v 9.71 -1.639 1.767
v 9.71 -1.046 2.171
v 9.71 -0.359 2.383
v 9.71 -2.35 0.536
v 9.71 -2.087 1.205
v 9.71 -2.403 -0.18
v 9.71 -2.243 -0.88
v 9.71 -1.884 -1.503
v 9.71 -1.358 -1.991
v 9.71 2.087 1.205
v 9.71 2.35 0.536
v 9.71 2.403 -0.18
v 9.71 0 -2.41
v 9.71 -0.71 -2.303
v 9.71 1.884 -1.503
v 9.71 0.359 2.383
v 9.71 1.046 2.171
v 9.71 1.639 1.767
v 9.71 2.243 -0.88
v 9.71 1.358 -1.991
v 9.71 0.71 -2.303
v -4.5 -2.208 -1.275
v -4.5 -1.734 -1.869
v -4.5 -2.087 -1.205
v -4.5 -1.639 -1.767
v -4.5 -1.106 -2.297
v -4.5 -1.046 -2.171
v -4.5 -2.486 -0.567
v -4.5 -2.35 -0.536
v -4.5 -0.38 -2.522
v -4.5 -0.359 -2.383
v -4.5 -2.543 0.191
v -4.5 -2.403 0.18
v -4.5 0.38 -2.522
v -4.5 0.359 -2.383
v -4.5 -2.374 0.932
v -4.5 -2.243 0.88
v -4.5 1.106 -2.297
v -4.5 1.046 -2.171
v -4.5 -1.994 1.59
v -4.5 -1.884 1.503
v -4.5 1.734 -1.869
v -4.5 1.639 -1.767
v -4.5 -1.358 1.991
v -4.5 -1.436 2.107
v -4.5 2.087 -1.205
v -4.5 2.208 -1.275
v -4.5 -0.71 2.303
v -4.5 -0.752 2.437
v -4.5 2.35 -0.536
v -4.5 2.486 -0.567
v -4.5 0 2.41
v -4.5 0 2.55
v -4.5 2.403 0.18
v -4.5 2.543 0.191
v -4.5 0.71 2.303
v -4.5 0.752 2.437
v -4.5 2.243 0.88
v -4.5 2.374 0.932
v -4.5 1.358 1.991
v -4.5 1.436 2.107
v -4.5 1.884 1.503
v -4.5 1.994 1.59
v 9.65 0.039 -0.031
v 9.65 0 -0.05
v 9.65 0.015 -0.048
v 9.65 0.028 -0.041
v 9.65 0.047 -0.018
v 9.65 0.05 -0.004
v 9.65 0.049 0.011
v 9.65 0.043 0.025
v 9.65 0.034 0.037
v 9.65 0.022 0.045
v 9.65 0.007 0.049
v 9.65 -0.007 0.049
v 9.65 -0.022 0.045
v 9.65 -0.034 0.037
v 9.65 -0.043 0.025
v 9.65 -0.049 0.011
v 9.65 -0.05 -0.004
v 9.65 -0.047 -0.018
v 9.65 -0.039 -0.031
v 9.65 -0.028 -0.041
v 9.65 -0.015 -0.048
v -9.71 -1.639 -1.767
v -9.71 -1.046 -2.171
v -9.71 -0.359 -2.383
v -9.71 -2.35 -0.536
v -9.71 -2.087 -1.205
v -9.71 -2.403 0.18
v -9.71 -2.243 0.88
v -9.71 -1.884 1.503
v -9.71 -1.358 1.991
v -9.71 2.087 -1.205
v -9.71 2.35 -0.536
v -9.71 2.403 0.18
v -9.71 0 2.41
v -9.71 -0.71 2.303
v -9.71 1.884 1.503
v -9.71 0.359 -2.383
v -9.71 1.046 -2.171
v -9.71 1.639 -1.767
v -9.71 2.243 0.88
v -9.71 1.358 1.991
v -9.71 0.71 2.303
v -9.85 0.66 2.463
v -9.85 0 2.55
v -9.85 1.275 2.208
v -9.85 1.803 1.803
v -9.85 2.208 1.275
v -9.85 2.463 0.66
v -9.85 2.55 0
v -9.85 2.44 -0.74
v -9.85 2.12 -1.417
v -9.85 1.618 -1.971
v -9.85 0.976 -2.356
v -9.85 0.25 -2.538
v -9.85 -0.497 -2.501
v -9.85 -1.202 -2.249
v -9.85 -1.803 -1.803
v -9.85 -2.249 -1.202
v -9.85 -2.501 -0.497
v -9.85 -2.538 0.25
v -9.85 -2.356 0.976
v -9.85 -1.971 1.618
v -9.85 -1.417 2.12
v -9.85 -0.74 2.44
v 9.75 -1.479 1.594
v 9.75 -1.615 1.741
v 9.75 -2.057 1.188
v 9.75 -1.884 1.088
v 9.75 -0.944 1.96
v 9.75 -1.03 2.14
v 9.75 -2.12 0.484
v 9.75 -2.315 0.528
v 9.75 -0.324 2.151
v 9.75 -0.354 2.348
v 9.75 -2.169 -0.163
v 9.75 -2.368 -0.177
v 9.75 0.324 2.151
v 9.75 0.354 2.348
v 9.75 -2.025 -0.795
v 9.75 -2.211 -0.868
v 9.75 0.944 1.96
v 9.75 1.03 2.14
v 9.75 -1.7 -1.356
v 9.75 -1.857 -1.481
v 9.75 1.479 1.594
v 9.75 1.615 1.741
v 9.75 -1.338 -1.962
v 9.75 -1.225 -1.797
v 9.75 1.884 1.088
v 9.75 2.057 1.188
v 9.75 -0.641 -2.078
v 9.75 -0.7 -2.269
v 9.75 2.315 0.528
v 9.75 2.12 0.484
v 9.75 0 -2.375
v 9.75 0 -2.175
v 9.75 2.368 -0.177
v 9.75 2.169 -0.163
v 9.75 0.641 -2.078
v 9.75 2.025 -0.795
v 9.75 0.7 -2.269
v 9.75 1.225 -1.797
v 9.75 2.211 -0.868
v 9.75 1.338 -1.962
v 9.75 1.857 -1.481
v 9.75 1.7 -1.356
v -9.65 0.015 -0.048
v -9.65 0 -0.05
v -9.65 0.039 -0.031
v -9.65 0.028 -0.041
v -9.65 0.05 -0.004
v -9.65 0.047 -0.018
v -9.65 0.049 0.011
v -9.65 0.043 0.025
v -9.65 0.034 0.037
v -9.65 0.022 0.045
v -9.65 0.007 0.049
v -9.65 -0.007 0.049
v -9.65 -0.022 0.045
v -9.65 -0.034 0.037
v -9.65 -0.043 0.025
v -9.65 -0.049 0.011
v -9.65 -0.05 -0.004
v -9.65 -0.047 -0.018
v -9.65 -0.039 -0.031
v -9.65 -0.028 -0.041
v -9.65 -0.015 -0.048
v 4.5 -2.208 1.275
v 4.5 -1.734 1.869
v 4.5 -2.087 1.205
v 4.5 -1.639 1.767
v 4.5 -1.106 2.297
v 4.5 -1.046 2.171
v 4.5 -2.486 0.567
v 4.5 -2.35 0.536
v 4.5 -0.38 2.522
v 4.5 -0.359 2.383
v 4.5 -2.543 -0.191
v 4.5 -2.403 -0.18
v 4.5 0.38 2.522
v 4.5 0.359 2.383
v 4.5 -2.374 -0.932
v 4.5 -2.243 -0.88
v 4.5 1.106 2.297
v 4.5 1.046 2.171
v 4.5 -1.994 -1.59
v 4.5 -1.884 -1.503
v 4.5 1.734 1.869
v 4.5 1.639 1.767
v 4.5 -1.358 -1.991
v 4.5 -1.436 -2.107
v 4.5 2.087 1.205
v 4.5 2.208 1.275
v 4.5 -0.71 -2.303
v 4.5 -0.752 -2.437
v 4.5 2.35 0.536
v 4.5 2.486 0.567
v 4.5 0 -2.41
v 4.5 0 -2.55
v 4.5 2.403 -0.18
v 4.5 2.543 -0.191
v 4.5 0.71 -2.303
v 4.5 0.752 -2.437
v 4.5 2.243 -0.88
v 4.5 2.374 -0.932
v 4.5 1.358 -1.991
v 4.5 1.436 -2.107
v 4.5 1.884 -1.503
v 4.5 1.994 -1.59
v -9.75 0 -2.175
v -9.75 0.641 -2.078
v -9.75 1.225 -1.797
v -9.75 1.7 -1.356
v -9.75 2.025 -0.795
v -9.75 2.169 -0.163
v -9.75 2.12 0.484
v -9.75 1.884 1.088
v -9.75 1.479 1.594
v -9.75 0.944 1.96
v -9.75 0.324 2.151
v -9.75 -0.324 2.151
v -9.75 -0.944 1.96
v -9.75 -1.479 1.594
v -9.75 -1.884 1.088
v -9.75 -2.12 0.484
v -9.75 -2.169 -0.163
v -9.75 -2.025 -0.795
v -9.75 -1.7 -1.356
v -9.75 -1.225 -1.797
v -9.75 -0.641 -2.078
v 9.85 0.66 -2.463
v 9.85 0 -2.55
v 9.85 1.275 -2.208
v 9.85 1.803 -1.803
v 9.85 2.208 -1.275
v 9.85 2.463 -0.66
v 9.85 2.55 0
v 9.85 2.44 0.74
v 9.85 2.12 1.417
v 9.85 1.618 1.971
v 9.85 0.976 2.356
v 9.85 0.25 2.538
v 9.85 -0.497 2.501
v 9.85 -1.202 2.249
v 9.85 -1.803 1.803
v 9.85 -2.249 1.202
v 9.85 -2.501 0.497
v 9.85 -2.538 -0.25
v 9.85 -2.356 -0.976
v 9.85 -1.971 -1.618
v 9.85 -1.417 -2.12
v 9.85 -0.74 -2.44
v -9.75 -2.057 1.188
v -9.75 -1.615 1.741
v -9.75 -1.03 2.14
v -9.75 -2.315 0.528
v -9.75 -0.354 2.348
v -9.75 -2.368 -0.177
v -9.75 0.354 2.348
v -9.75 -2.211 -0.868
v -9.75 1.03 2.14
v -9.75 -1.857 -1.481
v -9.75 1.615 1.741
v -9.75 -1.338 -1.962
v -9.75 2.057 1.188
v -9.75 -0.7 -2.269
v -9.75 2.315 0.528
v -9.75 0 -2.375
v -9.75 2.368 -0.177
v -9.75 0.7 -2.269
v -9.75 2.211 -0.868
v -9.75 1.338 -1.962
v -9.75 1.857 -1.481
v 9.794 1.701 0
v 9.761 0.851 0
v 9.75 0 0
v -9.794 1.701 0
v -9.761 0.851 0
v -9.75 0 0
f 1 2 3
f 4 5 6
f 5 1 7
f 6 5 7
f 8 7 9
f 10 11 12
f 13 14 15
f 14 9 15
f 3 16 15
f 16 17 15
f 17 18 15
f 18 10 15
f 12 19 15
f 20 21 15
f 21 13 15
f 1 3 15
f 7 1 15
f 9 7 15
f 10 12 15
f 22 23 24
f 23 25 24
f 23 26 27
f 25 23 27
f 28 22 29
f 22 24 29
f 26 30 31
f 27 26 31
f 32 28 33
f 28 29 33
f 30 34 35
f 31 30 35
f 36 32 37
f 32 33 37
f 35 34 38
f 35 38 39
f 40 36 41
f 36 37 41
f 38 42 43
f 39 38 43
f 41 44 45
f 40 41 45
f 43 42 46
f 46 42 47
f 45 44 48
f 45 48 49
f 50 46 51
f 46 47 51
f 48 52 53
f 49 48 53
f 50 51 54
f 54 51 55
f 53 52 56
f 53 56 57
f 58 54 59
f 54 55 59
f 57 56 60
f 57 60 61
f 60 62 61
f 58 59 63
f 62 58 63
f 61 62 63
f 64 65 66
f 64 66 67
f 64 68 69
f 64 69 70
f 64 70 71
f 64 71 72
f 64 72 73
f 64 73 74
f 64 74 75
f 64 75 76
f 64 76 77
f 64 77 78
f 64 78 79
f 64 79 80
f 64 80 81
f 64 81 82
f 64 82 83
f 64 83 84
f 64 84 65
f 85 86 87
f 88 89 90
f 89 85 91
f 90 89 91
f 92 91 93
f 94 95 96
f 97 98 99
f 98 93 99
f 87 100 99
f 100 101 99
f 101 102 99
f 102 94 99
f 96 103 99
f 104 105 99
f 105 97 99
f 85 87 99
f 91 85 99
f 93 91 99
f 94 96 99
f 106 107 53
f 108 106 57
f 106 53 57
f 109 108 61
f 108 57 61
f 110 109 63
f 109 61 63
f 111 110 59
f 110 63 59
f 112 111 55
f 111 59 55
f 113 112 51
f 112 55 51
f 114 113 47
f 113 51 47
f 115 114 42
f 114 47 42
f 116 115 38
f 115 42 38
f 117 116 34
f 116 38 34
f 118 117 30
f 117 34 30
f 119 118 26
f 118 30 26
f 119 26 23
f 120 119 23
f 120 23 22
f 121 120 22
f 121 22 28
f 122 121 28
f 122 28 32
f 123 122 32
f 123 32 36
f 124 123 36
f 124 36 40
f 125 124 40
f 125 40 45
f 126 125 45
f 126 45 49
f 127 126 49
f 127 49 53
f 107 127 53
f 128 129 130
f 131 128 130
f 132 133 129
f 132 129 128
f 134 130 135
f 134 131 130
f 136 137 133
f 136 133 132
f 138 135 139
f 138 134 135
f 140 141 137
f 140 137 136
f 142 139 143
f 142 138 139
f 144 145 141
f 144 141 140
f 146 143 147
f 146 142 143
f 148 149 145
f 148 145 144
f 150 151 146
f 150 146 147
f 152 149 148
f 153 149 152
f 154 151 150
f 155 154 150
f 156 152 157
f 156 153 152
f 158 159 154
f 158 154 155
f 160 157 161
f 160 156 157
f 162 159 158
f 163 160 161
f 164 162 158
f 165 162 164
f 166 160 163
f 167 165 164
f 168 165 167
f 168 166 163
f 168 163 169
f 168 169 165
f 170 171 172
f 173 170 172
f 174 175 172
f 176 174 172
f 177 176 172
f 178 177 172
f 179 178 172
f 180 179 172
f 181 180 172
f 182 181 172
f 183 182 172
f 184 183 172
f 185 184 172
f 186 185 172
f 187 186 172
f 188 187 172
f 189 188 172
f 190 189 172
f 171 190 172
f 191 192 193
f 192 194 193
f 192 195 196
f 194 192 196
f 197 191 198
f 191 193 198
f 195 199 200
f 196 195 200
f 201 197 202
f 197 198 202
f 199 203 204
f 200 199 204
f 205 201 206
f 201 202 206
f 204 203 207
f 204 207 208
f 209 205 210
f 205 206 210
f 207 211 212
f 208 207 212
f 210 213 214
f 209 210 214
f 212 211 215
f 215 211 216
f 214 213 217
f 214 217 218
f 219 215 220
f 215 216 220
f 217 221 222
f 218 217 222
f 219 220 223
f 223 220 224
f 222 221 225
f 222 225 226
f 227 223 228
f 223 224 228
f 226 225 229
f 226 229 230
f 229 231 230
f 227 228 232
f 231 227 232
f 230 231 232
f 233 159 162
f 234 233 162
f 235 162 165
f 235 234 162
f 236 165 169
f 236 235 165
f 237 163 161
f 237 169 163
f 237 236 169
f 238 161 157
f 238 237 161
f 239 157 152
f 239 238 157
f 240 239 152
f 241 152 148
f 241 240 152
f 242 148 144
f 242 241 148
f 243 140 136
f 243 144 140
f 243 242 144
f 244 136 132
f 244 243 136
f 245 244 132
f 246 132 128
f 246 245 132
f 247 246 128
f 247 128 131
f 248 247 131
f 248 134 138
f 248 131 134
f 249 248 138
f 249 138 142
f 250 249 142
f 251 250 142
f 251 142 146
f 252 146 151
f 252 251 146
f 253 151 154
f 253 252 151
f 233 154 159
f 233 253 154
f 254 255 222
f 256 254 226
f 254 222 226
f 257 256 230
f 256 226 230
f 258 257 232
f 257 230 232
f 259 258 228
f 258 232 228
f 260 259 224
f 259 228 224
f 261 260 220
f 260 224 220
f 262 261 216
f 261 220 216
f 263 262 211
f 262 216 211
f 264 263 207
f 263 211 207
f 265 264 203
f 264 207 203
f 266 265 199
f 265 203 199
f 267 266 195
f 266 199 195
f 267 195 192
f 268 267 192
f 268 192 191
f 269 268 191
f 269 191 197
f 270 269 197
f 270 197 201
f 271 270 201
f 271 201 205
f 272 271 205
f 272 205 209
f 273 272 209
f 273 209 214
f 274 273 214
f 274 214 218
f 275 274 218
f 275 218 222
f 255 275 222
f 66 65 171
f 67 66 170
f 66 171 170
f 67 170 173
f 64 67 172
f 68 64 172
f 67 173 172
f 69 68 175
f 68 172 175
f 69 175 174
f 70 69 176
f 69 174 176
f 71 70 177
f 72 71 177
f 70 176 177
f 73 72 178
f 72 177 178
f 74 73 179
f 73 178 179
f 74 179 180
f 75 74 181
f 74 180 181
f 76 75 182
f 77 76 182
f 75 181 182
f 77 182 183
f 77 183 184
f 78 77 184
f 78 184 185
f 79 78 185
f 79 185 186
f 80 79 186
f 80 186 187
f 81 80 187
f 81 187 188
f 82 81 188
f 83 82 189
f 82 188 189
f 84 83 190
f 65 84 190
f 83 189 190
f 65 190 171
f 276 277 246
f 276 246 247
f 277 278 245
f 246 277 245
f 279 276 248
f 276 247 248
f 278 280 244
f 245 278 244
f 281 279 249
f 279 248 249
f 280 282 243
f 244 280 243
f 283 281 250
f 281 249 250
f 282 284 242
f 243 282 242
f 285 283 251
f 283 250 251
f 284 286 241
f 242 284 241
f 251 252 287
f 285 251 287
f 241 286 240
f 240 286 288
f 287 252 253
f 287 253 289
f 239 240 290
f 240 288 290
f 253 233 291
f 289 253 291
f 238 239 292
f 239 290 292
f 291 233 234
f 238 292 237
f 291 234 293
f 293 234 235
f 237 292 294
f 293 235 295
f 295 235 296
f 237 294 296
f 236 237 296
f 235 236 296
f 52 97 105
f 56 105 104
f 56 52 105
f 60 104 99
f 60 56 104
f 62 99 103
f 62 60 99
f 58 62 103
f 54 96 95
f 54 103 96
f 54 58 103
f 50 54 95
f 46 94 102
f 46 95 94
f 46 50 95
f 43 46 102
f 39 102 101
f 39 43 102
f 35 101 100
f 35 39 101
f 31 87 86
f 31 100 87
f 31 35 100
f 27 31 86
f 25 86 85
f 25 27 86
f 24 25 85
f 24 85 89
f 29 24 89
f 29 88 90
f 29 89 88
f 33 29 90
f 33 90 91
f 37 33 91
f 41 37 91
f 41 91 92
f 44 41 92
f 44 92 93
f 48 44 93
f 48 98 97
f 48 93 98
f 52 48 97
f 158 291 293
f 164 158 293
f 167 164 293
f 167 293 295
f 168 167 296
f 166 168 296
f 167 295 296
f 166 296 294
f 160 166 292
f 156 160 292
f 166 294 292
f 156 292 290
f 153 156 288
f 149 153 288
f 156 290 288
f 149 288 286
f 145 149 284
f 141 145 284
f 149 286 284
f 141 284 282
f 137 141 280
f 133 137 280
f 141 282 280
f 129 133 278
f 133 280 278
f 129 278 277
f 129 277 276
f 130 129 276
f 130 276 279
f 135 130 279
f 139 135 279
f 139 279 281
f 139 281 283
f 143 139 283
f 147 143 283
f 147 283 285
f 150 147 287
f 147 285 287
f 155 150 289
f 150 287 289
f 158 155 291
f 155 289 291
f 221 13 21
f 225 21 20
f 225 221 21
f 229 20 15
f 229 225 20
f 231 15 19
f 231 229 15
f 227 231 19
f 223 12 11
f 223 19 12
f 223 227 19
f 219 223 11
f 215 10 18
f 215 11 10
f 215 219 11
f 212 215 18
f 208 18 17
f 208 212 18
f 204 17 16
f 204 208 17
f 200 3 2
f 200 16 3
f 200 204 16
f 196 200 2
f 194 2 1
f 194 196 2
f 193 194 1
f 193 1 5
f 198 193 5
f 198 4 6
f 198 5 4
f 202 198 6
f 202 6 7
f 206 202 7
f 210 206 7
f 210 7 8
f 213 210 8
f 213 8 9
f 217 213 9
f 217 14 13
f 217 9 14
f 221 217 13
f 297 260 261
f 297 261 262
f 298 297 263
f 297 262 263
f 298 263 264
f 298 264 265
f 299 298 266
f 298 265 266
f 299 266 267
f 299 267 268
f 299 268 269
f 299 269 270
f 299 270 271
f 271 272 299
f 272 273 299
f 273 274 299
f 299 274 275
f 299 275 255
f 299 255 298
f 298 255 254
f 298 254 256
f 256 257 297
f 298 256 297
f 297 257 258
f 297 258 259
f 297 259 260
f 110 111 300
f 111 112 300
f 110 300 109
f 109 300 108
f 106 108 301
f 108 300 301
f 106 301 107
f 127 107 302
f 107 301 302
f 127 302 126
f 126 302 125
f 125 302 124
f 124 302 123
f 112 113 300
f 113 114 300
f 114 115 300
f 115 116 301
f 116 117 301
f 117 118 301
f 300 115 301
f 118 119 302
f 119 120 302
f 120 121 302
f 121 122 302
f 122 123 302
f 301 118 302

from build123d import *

# Parameters (mm, degrees)
EXTRUDE1_DEPTH      = 9.75
EXTRUDE1_DEPTH_BACK = 9.75
SKETCH1_R           = 2.375
SHELL1_T            = -0.2
EXTRUDE2_DEPTH      = 9.65
EXTRUDE2_DEPTH_BACK = 9.65
SKETCH2_R           = 0.05
EXTRUDE3_DEPTH      = 0.1
EXTRUDE3_DEPTH_BACK = 5.25
SKETCH3_R           = 2.55
SHELL3_T            = -0.14
EXTRUDE5_DEPTH      = 0.1
EXTRUDE5_DEPTH_BACK = 5.25
SKETCH5_R           = 2.55
SHELL6_T            = -0.14


# Read off the part's stored shape, not the designer's step: Dome2, Dome3
with BuildPart() as part:
    # Sketch1 → Extrude1 (new, two sides: drawn at the far end of the back side and taken through both)
    with BuildSketch(Plane(origin=(0, 0, 0), x_dir=(0, 0, -1), z_dir=(1, 0, 0)).offset(-EXTRUDE1_DEPTH_BACK)):
        Circle(SKETCH1_R)
    extrude(amount=EXTRUDE1_DEPTH + EXTRUDE1_DEPTH_BACK)

    # Shell1
    shell1_openings = [part.faces().sort_by_distance(p)[0] for p in [
        (-9.75, 0, 0),
        (9.75, 0, 0),
    ]]
    offset(amount=SHELL1_T, openings=shell1_openings, kind=Kind.INTERSECTION)


with BuildPart() as body_2:
    # Sketch2 → Extrude2 (new, two sides: drawn at the far end of the back side and taken through both)
    with BuildSketch(Plane(origin=(0, 0, 0), x_dir=(0, 0, -1), z_dir=(1, 0, 0)).offset(-EXTRUDE2_DEPTH_BACK)):
        Circle(SKETCH2_R)
    extrude(amount=EXTRUDE2_DEPTH + EXTRUDE2_DEPTH_BACK)


with BuildPart() as body_3:
    # Sketch3 → Extrude3 (new, two sides: drawn at the far end of the back side and taken through both)
    with BuildSketch(Plane(origin=(9.75, 0, 0), x_dir=(0, 0, -1), z_dir=(1, 0, 0)).offset(-EXTRUDE3_DEPTH_BACK)):
        Circle(SKETCH3_R)
    extrude(amount=EXTRUDE3_DEPTH + EXTRUDE3_DEPTH_BACK)

    # Shell3
    shell3_openings = [body_3.faces().sort_by_distance(p)[0] for p in [
        (4.5, 0, 0),
    ]]
    offset(amount=SHELL3_T, openings=shell3_openings)

    # Dome2 outline → Dome2 (revolve, cut)
    with BuildSketch(Plane.YX):
        with BuildLine():
            Line((0, 9.850000003), (0, 9.75))
            ThreePointArc((0, 9.75), (1.275980032, 9.775009605), (2.550000032, 9.850000003))
            Line((2.550000032, 9.850000003), (0, 9.850000003))
        make_face()
    revolve(axis=Axis((0, 0, 0), (1, 0, 0)), mode=Mode.SUBTRACT)


with BuildPart() as body_4:
    # Sketch5 → Extrude5 (new, two sides: drawn at the far end of the back side and taken through both)
    with BuildSketch(Plane.ZY.offset(9.75).offset(-EXTRUDE5_DEPTH_BACK)):
        Circle(SKETCH5_R)
    extrude(amount=EXTRUDE5_DEPTH + EXTRUDE5_DEPTH_BACK)

    # Shell6
    shell6_openings = [body_4.faces().sort_by_distance(p)[0] for p in [
        (-4.5, 0, 0),
    ]]
    offset(amount=SHELL6_T, openings=shell6_openings)

    # Dome3 outline → Dome3 (revolve, cut)
    with BuildSketch(Plane.YX):
        with BuildLine():
            Line((0, -9.85), (2.550000032, -9.850000003))
            ThreePointArc((2.550000032, -9.850000003), (1.275980032, -9.775009605), (0, -9.75))
            Line((0, -9.75), (0, -9.85))
        make_face()
    revolve(axis=Axis((0, 0, 0), (1, 0, 0)), mode=Mode.SUBTRACT)


solid = Compound([part.part, body_2.part, body_3.part, body_4.part])
